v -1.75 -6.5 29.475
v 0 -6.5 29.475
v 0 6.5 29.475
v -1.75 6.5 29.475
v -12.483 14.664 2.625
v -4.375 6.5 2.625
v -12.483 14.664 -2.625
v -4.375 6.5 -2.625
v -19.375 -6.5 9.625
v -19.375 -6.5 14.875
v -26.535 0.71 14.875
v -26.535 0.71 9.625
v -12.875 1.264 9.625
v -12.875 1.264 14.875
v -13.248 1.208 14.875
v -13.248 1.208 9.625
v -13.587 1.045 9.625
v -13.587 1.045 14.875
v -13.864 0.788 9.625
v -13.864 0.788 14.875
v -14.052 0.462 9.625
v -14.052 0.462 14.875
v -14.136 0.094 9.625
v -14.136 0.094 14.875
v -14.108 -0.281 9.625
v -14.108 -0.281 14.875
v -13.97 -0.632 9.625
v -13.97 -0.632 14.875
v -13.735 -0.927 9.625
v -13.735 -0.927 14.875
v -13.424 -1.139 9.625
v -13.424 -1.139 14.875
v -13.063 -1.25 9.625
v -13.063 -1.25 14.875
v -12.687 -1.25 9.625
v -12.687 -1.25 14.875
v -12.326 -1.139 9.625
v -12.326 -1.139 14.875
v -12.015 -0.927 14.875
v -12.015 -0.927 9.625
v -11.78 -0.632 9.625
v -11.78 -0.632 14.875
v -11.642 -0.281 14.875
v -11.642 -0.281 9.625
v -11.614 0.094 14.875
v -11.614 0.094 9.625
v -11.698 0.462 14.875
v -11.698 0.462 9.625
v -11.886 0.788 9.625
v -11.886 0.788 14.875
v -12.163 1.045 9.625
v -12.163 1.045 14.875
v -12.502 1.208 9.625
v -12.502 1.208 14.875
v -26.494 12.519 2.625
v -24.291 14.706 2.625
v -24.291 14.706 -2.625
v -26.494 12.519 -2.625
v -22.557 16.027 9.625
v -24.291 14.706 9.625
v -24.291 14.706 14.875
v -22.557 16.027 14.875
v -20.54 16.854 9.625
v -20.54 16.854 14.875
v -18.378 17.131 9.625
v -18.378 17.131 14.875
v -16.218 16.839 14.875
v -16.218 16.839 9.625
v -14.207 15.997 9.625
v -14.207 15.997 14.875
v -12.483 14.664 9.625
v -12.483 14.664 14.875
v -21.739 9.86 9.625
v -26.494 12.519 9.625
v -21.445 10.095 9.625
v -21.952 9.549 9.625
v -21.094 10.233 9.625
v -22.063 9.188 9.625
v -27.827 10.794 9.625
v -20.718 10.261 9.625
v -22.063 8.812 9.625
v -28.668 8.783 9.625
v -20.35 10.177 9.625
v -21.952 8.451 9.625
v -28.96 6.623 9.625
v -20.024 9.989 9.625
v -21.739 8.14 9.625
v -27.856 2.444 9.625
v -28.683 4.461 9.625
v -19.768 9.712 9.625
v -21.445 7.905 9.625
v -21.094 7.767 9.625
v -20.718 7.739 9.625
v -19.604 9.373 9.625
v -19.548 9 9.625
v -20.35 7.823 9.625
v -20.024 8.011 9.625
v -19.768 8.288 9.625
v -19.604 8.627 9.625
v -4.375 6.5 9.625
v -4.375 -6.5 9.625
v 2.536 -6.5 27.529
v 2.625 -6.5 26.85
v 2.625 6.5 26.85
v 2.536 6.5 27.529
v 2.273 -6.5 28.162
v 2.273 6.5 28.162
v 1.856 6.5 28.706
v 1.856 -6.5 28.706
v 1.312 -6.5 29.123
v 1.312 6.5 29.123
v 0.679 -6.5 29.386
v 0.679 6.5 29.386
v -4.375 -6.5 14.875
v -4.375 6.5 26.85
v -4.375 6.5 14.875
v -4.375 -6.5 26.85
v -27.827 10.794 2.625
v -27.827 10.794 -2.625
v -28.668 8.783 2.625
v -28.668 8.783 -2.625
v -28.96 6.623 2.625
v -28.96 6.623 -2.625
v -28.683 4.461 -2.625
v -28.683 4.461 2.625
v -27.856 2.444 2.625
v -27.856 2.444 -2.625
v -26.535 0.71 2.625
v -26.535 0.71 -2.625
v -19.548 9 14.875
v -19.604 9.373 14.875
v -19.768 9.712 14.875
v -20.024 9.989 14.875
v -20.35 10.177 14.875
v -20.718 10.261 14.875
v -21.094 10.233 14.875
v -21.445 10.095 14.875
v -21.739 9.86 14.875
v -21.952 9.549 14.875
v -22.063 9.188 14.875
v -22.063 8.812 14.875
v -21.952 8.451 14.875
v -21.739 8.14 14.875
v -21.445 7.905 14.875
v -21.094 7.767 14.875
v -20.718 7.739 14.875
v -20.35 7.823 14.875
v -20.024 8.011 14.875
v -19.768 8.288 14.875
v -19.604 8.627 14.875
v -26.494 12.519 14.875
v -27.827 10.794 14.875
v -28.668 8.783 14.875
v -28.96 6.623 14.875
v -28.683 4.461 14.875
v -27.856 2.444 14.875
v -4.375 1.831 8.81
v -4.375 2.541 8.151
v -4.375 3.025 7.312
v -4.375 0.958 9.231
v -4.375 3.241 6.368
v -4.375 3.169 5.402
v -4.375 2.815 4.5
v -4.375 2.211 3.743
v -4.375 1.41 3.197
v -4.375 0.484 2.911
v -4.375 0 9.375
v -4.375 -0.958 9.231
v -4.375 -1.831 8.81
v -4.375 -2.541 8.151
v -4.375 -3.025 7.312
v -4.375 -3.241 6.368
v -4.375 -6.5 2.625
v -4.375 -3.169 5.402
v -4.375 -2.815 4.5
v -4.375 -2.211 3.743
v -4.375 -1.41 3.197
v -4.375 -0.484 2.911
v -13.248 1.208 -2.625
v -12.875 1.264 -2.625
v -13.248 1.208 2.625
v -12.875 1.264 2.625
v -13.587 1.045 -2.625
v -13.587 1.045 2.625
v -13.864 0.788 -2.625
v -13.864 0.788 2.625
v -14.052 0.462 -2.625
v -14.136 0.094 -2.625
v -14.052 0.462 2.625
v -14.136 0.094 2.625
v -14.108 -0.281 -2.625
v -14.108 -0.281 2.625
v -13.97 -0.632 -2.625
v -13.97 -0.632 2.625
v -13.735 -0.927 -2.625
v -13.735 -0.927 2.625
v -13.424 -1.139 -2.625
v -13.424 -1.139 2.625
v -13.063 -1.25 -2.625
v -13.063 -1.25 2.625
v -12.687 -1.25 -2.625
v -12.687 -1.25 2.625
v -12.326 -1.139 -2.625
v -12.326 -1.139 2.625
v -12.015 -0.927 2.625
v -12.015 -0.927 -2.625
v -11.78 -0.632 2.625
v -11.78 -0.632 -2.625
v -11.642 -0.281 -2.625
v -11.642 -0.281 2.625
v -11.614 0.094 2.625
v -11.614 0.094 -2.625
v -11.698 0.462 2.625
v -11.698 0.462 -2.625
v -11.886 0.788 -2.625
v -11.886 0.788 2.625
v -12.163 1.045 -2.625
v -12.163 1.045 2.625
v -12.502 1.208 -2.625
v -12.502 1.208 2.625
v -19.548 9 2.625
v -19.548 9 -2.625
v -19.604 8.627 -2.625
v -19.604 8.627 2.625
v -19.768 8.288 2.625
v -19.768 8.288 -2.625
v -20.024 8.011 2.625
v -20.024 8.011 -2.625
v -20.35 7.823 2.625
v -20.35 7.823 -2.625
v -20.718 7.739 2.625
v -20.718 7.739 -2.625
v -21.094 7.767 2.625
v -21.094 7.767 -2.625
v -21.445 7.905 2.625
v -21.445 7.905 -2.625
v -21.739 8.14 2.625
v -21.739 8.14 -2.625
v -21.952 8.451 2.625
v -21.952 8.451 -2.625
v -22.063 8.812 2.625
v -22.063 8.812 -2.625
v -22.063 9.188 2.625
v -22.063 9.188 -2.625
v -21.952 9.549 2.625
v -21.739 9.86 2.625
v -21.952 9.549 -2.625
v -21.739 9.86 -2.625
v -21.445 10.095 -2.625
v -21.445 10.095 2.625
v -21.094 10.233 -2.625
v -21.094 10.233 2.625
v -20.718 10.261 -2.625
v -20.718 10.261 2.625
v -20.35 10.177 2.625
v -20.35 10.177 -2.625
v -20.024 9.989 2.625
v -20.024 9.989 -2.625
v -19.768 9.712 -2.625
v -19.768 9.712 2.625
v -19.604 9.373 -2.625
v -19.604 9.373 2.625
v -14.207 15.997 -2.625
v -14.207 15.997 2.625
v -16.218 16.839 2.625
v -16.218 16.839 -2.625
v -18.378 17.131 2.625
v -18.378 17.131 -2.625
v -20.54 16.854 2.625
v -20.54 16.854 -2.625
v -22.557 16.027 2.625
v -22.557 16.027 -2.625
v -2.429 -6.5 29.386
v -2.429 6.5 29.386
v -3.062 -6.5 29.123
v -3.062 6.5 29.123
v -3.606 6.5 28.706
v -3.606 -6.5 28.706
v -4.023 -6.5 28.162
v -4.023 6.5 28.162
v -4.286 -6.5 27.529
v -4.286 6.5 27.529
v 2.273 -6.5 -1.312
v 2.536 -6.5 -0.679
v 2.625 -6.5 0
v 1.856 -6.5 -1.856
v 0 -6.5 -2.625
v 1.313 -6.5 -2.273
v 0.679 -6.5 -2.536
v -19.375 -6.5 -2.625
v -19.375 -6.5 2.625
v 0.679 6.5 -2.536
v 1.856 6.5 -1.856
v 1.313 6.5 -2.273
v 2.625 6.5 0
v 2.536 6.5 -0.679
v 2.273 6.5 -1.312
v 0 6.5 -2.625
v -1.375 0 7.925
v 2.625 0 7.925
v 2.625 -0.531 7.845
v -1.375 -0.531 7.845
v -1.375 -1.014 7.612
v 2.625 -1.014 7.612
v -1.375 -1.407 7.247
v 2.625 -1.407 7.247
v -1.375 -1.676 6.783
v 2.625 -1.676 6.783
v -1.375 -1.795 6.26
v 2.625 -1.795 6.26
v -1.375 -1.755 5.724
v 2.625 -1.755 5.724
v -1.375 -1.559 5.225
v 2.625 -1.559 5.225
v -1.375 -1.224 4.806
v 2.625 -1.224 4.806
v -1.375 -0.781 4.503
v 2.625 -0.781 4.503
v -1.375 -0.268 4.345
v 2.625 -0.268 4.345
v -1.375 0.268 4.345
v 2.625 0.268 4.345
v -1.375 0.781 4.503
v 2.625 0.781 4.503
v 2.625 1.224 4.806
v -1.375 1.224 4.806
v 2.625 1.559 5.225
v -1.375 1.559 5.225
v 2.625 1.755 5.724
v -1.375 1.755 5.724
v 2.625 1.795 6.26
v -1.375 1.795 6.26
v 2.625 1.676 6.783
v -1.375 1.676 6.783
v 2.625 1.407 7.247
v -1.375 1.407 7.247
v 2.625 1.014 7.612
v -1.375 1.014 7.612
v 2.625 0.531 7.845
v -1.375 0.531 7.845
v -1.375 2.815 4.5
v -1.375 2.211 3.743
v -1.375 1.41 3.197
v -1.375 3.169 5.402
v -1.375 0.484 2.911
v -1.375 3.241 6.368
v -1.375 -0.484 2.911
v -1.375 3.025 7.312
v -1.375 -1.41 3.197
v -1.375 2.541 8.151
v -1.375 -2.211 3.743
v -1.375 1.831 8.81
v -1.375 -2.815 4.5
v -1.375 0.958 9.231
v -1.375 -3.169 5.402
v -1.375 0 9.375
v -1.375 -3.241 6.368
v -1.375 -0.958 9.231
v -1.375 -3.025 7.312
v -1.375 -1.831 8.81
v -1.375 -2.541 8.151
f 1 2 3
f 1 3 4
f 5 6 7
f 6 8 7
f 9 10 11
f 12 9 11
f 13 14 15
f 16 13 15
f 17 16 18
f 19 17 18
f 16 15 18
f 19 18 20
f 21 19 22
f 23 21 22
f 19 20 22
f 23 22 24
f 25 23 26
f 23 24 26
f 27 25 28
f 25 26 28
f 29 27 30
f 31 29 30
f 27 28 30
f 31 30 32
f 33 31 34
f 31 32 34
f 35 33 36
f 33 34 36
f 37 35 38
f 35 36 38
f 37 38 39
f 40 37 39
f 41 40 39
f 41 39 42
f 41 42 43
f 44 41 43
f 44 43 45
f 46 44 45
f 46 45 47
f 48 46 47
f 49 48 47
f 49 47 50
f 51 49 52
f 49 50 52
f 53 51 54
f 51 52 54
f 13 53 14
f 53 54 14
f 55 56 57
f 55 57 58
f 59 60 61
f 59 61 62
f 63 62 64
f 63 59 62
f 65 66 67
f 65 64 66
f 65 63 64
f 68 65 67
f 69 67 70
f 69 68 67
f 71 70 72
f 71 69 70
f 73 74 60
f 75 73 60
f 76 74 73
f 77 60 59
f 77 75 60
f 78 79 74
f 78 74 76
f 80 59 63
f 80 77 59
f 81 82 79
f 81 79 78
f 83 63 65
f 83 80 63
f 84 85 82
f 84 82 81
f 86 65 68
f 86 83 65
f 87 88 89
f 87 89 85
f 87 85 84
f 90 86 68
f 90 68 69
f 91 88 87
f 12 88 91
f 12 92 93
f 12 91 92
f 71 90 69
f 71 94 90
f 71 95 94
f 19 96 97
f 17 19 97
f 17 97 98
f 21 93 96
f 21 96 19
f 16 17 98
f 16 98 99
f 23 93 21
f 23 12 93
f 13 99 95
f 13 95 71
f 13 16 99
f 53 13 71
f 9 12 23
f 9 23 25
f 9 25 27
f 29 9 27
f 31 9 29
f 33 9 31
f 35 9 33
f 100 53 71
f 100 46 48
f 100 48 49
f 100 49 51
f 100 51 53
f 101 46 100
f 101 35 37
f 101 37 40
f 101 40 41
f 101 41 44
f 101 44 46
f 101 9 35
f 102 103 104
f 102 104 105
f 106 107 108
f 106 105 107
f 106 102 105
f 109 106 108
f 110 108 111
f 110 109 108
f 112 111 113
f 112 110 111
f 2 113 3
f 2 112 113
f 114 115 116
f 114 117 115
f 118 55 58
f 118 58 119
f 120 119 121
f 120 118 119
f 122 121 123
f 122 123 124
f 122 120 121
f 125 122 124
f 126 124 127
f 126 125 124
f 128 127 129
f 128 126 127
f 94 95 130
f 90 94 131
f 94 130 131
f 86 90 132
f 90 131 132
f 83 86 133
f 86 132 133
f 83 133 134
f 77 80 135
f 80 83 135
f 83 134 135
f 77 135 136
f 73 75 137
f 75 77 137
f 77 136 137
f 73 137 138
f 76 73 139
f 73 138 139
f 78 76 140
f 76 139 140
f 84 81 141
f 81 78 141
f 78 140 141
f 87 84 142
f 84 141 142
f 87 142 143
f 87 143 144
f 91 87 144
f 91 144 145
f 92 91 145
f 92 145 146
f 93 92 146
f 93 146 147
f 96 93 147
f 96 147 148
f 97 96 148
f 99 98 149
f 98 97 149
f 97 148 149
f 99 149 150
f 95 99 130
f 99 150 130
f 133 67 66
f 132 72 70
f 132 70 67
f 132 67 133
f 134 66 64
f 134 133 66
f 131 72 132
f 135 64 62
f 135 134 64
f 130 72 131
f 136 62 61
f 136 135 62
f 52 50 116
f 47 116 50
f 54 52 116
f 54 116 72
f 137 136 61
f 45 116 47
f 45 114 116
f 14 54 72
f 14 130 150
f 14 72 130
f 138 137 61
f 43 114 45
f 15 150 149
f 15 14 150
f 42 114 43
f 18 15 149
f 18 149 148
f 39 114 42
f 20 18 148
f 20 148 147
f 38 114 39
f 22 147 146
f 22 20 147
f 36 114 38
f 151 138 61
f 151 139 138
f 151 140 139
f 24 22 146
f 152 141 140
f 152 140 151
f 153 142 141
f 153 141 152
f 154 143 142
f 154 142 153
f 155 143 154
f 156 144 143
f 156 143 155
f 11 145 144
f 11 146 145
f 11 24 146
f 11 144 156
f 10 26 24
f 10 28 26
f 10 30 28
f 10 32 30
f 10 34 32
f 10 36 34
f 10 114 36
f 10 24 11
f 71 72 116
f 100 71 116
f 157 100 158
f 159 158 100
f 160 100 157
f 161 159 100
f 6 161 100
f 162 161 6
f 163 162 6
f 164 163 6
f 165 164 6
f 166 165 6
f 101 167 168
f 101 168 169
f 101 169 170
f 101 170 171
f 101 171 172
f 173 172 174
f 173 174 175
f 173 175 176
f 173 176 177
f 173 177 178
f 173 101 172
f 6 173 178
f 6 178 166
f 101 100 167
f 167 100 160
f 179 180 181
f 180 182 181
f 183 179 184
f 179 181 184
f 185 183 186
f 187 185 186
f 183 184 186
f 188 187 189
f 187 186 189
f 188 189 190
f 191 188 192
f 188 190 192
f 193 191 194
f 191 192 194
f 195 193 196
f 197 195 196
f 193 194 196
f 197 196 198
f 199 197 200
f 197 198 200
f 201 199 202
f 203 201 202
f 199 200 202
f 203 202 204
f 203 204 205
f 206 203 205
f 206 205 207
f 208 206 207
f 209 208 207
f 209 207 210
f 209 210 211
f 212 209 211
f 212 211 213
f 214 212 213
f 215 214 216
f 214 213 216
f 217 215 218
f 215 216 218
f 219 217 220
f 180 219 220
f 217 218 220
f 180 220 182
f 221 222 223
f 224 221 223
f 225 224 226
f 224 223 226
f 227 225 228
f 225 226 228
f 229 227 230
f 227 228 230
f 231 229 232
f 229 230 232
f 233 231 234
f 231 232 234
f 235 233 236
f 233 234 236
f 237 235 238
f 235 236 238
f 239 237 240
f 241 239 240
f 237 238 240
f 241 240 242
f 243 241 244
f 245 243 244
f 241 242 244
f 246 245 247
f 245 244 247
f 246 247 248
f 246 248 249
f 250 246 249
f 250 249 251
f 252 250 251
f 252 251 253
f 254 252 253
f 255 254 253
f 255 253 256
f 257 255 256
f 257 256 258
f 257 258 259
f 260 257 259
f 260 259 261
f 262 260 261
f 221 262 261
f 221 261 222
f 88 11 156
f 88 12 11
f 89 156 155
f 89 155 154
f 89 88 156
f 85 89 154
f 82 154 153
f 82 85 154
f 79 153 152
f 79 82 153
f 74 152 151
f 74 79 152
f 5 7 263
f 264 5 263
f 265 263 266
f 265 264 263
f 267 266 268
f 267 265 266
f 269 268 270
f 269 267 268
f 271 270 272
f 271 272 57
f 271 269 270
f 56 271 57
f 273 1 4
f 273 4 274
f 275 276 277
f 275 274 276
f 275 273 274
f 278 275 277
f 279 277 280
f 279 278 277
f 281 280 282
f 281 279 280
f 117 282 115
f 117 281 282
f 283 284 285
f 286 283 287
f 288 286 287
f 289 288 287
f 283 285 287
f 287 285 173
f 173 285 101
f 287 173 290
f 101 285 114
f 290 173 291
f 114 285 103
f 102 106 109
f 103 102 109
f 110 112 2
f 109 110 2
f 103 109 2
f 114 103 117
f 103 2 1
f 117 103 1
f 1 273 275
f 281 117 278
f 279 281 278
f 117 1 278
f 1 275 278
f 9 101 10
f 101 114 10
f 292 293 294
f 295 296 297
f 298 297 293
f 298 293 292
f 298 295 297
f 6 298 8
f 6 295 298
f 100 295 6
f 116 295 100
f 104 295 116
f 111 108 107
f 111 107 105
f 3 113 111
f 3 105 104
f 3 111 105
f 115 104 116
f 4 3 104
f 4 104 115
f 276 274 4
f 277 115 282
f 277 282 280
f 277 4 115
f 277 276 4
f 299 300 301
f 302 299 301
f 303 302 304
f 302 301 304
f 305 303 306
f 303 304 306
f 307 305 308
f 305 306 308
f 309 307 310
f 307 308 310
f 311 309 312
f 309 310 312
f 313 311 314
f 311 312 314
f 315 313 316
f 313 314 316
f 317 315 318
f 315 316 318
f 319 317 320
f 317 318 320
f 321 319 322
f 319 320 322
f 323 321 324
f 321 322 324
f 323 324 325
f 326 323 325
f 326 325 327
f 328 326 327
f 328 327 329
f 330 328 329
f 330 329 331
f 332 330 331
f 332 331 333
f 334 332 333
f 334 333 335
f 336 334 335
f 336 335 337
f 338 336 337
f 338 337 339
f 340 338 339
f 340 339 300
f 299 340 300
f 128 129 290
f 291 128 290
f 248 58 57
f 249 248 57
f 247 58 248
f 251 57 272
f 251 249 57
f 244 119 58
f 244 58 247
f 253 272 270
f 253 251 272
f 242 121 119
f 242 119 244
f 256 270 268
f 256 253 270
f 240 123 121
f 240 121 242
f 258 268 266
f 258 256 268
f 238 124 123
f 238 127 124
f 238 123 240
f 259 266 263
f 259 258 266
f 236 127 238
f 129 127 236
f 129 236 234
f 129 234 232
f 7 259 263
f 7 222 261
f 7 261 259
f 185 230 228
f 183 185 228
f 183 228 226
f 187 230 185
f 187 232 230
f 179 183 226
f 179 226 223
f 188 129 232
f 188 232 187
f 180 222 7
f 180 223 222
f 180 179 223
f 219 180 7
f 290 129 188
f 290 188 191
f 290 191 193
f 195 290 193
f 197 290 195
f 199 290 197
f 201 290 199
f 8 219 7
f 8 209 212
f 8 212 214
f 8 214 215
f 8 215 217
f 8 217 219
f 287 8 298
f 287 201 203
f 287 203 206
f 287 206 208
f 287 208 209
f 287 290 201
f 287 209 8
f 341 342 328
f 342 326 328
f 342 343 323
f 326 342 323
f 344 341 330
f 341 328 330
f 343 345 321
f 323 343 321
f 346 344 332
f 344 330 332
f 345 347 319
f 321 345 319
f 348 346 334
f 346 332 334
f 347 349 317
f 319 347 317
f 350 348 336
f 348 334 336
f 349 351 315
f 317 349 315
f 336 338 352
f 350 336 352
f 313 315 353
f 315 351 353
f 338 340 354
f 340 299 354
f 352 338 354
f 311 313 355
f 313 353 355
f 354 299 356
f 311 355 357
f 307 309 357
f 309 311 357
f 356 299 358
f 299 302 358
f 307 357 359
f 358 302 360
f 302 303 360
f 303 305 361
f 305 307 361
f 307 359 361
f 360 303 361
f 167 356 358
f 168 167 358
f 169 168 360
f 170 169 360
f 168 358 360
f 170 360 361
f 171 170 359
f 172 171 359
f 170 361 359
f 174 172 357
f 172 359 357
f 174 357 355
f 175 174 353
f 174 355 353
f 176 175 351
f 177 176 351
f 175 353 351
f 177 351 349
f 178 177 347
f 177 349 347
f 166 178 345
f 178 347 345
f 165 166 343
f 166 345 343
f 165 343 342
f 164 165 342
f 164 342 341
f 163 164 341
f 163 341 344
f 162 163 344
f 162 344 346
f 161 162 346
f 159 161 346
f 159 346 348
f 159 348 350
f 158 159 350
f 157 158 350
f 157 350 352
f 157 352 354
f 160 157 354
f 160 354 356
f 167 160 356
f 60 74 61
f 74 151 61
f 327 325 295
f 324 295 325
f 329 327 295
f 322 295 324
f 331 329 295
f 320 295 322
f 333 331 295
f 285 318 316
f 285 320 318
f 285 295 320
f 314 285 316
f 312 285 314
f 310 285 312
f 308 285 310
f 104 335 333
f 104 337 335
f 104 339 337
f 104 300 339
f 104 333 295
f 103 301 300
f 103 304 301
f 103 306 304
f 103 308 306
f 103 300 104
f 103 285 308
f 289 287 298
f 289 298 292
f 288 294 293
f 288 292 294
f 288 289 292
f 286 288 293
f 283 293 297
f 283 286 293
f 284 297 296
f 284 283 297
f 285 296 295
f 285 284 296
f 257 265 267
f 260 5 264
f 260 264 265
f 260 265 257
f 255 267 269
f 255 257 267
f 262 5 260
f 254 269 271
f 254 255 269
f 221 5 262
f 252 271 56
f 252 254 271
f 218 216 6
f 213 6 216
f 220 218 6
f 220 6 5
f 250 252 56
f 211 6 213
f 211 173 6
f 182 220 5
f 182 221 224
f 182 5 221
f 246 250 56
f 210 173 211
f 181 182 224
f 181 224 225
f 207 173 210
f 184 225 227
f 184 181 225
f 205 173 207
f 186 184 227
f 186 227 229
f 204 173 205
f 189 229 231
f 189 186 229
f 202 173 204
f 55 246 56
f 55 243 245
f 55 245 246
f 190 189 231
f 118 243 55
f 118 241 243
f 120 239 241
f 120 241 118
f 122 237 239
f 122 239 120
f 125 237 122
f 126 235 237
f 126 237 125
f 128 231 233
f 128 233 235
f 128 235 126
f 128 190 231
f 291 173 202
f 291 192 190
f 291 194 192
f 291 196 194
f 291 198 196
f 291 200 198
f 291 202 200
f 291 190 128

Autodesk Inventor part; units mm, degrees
ref_plane "YZ Plane" through (0, 0, 0) normal (1, 0, 0) x (0, 1, 0)
ref_plane "Work Plane1" through (0, -6.5, 0) normal (0, 1, 0) x (-1, 0, 0)
sketch "Sketch1" plane through (0, -6.5, 0) normal (0, 1, 0) x (-1, 0, 0)
  arc A0 (-2.625, 0) -> (0, -2.625) centre (0, 0) ccw
  line L0 (-2.625, 0) -> (-2.625, 26.85)
  arc A1 (0, 29.475) -> (-2.625, 26.85) centre (0, 26.85) ccw
  line L1 (4.375, 26.85) -> (4.375, 14.875)
  line L2 (16.75, 9.625) -> (4.375, 9.625)
  line L3 (0, 29.475) -> (1.75, 29.475)
  line L4 (4.375, 9.625) -> (4.375, 2.625)
  arc A2 (4.375, 26.85) -> (1.75, 29.475) centre (1.75, 26.85) ccw
  line L5 (4.375, 14.875) -> (16.75, 14.875)
  line L6 (16.75, -2.625) -> (0, -2.625)
  arc A3 (16.75, 9.625) -> (16.75, 14.875) centre (16.75, 12.25) ccw
  line L7 (4.375, 2.625) -> (16.75, 2.625)
  arc A4 (16.75, -2.625) -> (16.75, 2.625) centre (16.75, 0) ccw
  dimension "d35" = 7
  dimension "d36" = 7
  dimension "d37" = 12.375
  dimension "d38" = 5.25
  dimension "d39" = 14.6
extrude "Extrusion2" add sketch "Sketch1" along normal blind 13
hole "Hole3" at (-12.875, 0, 9.625) direction (0, 0, 1) diameter 2.529 depth 5.25
sketch "Sketch3" plane through (-4.375, -6.5, 9.625) normal (0, 0, -1) x (-1, 0, 0)
  point P0 (8.5, 6.5)
hole "Hole1" at (-12.875, 0, -2.625) direction (0, 0, 1) diameter 2.529 depth 5.25
sketch "Sketch6" plane through (-16.75, -6.5, 14.875) normal (0, 0, 1) x (1, 0, 0)
  circle A0 centre (-4.0623, 15.5) radius 4.5
  circle A1 centre (3.875, 6.5) radius 4.5
  circle A2 centre (3.875, 6.5) radius 1.2645 projected
  line L0 (0, 0) -> (12.375, 0) projected
  line L1 (12.375, 0) -> (12.375, 13) projected
  line L2 (0, 13) -> (12.375, 13) projected
  line L3 (0, 0) -> (0, 13) projected
  circle A3 centre (3.875, 6.5) radius 1.2645 projected
  circle A4 centre (-4.0623, 15.5) radius 6.5
  circle A5 centre (3.875, 6.5) radius 6.5
  line L4 (3.875, 11) -> (-4.0623, 11)
  line L5 (0, 0) -> (0, 0) projected
  line L6 (0, 0) -> (0, 13) projected
  line L7 (0, 13) -> (0, 13) projected
  line L8 (0, 0) -> (0, 13) projected
  line L9 (-2.625, 0) -> (-2.625, 13) projected
  line L10 (-2.625, 0) -> (-15.6685, 13.1351)
  line L11 (-15.6685, 13.1351) -> (-1.6162, 27.0894)
  line L12 (12.375, 0) -> (12.375, 13) projected
  line L13 (-1.6162, 27.0894) -> (12.375, 13)
  line L14 (2.9639, 22.4772) -> (-11.0884, 8.5228)
  circle A6 centre (-4.0623, 15.5) radius 1.2645
  point P0 (16.75, 6.5)
  point P1 (-2.625, 11)
  point P2 (-0.8154, 11)
  point P3 (0, 11.7187)
  dimension "d26" = 9
  dimension "d27" = 9
  dimension "d28" = 2
  dimension "d29" = 2
  dimension "d30" = 1
extrude "Extrusion4" add sketch "Sketch6" against normal up to surface (5.25 mm away) contours A0 L14 A6 | A0 L14 A4 L2 L3 A5 L4 L9 | L14 A6 A0 | A0 L14 A4 | L9 L4 A0 | A0 L4 L9 A4 L14 | L14 L13 L2 A4 | A4 L11 L13 L14 | L14 L10 L11 A4 | A4 L9 L10 L14
sketch "Sketch7" plane through (0, -6.5, 0) normal (0, -1, 0) x (1, 0, 0)
  arc A0 (0, -2.625) -> (2.625, 0) centre (0, 0) ccw projected
  line L0 (2.625, 26.85) -> (2.625, 0) projected
  arc A1 (2.625, 26.85) -> (0, 29.475) centre (0, 26.85) ccw projected
  line L1 (-1.75, 29.475) -> (0, 29.475) projected
  arc A2 (-1.75, 29.475) -> (-4.375, 26.85) centre (-1.75, 26.85) ccw projected
  line L2 (-4.375, 14.875) -> (-4.375, 26.85) projected
  line L3 (-16.75, 14.875) -> (-4.375, 14.875) projected
  arc A3 (-16.75, 14.875) -> (-19.375, 12.25) centre (-16.75, 12.25) ccw projected
  arc A4 (-19.375, 12.25) -> (-16.75, 9.625) centre (-16.75, 12.25) ccw projected
  line L4 (-4.375, 9.625) -> (-16.75, 9.625) projected
  line L5 (-4.375, 2.625) -> (-4.375, 9.625) projected
  line L6 (-16.75, 2.625) -> (-4.375, 2.625) projected
  arc A5 (-16.75, 2.625) -> (-16.75, -2.625) centre (-16.75, 0) ccw projected
  line L7 (0, -2.625) -> (-16.75, -2.625) projected
  arc A6 (-17.5654, 14.7451) -> (-19.375, 12.25) centre (-16.75, 12.25) ccw projected
  line L8 (-17.5654, 14.875) -> (-17.5654, 14.7451) projected
  line L9 (-19.375, 14.875) -> (-17.5654, 14.875) projected
  line L10 (-19.375, 14.875) -> (-19.375, 12.25) projected
  line L11 (-32.4185, 9.625) -> (-19.375, 9.625) projected
  line L12 (-19.375, 12.25) -> (-19.375, 9.625) projected
  line L13 (-19.375, 14.875) -> (-19.375, 12.25) projected
  line L14 (-32.4185, 14.875) -> (-19.375, 14.875) projected
  line L15 (-32.4185, 14.875) -> (-32.4185, 9.625) projected
  arc A7 (-19.375, 12.25) -> (-17.5654, 9.7549) centre (-16.75, 12.25) ccw projected
  line L16 (-19.375, 12.25) -> (-19.375, 9.625) projected
  line L17 (-19.375, 9.625) -> (-17.5654, 9.625) projected
  line L18 (-17.5654, 9.7549) -> (-17.5654, 9.625) projected
  line L19 (-17.5654, 9.7549) -> (-17.5654, 9.625) projected
  line L20 (-17.5654, 9.625) -> (-16.75, 9.625) projected
  line L21 (-17.5654, 14.875) -> (-16.75, 14.875) projected
  line L22 (-17.5654, 14.875) -> (-17.5654, 14.7451) projected
  point P0 (-16.75, 9.625)
extrude "Extrusion5" add sketch "Sketch7" against normal blind 15 contours L20 L18 A4 | L18 L17 L12 A4 | A3 L8 L21 | L10 L9 L8 A3
ref_plane "Work Plane2" through (-4.375, -6.5, 6.125) normal (0, 0, -1) x (-1, 0, 0)
mirror "Mirror1" about plane through (-4.375, -6.5, 6.125) normal (0, 0, -1) of "Extrusion4", "Extrusion5"
fillet "Fillet1" radius 8.35 4 edges at (-32.4185, 6.6351, 12.25) (-18.3662, 20.5894, 12.25) (-18.3662, 20.5894, 0) (-32.4185, 6.6351, 0)
sketch "Sketch8" plane through (-4.375, -6.5, 2.625) normal (-1, 0, 0) x (0, 0, 1)
  line L0 (0, 0) -> (7, 0) projected
  line L1 (7, 0) -> (7, 13) projected
  line L2 (0, 13) -> (7, 13) projected
  line L3 (0, 0) -> (0, 13) projected
  line L4 (0, 0) -> (0, 13) projected
  line L5 (0, 6.5) -> (7, 6.5)
  line L6 (7, 0) -> (7, 13) projected
  point P0 (-2.625, 6.5)
  point P1 (3.5, 6.5)
hole "Hole5" at (-4.375, 0, 6.125) direction (1, 0, 0) diameter 3.6 end through all counterbore diameter 6.5 counterbore depth 3 clearance for "Socket Head Cap Screw" size "M3" standard "Ansi Metric M Profile"
sketch "Sketch5" plane through (0, -6.5, -2.625) normal (0, 0, -1) x (-1, 0, 0)
  point P0 (12.875, 6.5)
properties part number "Idle belt holder"
